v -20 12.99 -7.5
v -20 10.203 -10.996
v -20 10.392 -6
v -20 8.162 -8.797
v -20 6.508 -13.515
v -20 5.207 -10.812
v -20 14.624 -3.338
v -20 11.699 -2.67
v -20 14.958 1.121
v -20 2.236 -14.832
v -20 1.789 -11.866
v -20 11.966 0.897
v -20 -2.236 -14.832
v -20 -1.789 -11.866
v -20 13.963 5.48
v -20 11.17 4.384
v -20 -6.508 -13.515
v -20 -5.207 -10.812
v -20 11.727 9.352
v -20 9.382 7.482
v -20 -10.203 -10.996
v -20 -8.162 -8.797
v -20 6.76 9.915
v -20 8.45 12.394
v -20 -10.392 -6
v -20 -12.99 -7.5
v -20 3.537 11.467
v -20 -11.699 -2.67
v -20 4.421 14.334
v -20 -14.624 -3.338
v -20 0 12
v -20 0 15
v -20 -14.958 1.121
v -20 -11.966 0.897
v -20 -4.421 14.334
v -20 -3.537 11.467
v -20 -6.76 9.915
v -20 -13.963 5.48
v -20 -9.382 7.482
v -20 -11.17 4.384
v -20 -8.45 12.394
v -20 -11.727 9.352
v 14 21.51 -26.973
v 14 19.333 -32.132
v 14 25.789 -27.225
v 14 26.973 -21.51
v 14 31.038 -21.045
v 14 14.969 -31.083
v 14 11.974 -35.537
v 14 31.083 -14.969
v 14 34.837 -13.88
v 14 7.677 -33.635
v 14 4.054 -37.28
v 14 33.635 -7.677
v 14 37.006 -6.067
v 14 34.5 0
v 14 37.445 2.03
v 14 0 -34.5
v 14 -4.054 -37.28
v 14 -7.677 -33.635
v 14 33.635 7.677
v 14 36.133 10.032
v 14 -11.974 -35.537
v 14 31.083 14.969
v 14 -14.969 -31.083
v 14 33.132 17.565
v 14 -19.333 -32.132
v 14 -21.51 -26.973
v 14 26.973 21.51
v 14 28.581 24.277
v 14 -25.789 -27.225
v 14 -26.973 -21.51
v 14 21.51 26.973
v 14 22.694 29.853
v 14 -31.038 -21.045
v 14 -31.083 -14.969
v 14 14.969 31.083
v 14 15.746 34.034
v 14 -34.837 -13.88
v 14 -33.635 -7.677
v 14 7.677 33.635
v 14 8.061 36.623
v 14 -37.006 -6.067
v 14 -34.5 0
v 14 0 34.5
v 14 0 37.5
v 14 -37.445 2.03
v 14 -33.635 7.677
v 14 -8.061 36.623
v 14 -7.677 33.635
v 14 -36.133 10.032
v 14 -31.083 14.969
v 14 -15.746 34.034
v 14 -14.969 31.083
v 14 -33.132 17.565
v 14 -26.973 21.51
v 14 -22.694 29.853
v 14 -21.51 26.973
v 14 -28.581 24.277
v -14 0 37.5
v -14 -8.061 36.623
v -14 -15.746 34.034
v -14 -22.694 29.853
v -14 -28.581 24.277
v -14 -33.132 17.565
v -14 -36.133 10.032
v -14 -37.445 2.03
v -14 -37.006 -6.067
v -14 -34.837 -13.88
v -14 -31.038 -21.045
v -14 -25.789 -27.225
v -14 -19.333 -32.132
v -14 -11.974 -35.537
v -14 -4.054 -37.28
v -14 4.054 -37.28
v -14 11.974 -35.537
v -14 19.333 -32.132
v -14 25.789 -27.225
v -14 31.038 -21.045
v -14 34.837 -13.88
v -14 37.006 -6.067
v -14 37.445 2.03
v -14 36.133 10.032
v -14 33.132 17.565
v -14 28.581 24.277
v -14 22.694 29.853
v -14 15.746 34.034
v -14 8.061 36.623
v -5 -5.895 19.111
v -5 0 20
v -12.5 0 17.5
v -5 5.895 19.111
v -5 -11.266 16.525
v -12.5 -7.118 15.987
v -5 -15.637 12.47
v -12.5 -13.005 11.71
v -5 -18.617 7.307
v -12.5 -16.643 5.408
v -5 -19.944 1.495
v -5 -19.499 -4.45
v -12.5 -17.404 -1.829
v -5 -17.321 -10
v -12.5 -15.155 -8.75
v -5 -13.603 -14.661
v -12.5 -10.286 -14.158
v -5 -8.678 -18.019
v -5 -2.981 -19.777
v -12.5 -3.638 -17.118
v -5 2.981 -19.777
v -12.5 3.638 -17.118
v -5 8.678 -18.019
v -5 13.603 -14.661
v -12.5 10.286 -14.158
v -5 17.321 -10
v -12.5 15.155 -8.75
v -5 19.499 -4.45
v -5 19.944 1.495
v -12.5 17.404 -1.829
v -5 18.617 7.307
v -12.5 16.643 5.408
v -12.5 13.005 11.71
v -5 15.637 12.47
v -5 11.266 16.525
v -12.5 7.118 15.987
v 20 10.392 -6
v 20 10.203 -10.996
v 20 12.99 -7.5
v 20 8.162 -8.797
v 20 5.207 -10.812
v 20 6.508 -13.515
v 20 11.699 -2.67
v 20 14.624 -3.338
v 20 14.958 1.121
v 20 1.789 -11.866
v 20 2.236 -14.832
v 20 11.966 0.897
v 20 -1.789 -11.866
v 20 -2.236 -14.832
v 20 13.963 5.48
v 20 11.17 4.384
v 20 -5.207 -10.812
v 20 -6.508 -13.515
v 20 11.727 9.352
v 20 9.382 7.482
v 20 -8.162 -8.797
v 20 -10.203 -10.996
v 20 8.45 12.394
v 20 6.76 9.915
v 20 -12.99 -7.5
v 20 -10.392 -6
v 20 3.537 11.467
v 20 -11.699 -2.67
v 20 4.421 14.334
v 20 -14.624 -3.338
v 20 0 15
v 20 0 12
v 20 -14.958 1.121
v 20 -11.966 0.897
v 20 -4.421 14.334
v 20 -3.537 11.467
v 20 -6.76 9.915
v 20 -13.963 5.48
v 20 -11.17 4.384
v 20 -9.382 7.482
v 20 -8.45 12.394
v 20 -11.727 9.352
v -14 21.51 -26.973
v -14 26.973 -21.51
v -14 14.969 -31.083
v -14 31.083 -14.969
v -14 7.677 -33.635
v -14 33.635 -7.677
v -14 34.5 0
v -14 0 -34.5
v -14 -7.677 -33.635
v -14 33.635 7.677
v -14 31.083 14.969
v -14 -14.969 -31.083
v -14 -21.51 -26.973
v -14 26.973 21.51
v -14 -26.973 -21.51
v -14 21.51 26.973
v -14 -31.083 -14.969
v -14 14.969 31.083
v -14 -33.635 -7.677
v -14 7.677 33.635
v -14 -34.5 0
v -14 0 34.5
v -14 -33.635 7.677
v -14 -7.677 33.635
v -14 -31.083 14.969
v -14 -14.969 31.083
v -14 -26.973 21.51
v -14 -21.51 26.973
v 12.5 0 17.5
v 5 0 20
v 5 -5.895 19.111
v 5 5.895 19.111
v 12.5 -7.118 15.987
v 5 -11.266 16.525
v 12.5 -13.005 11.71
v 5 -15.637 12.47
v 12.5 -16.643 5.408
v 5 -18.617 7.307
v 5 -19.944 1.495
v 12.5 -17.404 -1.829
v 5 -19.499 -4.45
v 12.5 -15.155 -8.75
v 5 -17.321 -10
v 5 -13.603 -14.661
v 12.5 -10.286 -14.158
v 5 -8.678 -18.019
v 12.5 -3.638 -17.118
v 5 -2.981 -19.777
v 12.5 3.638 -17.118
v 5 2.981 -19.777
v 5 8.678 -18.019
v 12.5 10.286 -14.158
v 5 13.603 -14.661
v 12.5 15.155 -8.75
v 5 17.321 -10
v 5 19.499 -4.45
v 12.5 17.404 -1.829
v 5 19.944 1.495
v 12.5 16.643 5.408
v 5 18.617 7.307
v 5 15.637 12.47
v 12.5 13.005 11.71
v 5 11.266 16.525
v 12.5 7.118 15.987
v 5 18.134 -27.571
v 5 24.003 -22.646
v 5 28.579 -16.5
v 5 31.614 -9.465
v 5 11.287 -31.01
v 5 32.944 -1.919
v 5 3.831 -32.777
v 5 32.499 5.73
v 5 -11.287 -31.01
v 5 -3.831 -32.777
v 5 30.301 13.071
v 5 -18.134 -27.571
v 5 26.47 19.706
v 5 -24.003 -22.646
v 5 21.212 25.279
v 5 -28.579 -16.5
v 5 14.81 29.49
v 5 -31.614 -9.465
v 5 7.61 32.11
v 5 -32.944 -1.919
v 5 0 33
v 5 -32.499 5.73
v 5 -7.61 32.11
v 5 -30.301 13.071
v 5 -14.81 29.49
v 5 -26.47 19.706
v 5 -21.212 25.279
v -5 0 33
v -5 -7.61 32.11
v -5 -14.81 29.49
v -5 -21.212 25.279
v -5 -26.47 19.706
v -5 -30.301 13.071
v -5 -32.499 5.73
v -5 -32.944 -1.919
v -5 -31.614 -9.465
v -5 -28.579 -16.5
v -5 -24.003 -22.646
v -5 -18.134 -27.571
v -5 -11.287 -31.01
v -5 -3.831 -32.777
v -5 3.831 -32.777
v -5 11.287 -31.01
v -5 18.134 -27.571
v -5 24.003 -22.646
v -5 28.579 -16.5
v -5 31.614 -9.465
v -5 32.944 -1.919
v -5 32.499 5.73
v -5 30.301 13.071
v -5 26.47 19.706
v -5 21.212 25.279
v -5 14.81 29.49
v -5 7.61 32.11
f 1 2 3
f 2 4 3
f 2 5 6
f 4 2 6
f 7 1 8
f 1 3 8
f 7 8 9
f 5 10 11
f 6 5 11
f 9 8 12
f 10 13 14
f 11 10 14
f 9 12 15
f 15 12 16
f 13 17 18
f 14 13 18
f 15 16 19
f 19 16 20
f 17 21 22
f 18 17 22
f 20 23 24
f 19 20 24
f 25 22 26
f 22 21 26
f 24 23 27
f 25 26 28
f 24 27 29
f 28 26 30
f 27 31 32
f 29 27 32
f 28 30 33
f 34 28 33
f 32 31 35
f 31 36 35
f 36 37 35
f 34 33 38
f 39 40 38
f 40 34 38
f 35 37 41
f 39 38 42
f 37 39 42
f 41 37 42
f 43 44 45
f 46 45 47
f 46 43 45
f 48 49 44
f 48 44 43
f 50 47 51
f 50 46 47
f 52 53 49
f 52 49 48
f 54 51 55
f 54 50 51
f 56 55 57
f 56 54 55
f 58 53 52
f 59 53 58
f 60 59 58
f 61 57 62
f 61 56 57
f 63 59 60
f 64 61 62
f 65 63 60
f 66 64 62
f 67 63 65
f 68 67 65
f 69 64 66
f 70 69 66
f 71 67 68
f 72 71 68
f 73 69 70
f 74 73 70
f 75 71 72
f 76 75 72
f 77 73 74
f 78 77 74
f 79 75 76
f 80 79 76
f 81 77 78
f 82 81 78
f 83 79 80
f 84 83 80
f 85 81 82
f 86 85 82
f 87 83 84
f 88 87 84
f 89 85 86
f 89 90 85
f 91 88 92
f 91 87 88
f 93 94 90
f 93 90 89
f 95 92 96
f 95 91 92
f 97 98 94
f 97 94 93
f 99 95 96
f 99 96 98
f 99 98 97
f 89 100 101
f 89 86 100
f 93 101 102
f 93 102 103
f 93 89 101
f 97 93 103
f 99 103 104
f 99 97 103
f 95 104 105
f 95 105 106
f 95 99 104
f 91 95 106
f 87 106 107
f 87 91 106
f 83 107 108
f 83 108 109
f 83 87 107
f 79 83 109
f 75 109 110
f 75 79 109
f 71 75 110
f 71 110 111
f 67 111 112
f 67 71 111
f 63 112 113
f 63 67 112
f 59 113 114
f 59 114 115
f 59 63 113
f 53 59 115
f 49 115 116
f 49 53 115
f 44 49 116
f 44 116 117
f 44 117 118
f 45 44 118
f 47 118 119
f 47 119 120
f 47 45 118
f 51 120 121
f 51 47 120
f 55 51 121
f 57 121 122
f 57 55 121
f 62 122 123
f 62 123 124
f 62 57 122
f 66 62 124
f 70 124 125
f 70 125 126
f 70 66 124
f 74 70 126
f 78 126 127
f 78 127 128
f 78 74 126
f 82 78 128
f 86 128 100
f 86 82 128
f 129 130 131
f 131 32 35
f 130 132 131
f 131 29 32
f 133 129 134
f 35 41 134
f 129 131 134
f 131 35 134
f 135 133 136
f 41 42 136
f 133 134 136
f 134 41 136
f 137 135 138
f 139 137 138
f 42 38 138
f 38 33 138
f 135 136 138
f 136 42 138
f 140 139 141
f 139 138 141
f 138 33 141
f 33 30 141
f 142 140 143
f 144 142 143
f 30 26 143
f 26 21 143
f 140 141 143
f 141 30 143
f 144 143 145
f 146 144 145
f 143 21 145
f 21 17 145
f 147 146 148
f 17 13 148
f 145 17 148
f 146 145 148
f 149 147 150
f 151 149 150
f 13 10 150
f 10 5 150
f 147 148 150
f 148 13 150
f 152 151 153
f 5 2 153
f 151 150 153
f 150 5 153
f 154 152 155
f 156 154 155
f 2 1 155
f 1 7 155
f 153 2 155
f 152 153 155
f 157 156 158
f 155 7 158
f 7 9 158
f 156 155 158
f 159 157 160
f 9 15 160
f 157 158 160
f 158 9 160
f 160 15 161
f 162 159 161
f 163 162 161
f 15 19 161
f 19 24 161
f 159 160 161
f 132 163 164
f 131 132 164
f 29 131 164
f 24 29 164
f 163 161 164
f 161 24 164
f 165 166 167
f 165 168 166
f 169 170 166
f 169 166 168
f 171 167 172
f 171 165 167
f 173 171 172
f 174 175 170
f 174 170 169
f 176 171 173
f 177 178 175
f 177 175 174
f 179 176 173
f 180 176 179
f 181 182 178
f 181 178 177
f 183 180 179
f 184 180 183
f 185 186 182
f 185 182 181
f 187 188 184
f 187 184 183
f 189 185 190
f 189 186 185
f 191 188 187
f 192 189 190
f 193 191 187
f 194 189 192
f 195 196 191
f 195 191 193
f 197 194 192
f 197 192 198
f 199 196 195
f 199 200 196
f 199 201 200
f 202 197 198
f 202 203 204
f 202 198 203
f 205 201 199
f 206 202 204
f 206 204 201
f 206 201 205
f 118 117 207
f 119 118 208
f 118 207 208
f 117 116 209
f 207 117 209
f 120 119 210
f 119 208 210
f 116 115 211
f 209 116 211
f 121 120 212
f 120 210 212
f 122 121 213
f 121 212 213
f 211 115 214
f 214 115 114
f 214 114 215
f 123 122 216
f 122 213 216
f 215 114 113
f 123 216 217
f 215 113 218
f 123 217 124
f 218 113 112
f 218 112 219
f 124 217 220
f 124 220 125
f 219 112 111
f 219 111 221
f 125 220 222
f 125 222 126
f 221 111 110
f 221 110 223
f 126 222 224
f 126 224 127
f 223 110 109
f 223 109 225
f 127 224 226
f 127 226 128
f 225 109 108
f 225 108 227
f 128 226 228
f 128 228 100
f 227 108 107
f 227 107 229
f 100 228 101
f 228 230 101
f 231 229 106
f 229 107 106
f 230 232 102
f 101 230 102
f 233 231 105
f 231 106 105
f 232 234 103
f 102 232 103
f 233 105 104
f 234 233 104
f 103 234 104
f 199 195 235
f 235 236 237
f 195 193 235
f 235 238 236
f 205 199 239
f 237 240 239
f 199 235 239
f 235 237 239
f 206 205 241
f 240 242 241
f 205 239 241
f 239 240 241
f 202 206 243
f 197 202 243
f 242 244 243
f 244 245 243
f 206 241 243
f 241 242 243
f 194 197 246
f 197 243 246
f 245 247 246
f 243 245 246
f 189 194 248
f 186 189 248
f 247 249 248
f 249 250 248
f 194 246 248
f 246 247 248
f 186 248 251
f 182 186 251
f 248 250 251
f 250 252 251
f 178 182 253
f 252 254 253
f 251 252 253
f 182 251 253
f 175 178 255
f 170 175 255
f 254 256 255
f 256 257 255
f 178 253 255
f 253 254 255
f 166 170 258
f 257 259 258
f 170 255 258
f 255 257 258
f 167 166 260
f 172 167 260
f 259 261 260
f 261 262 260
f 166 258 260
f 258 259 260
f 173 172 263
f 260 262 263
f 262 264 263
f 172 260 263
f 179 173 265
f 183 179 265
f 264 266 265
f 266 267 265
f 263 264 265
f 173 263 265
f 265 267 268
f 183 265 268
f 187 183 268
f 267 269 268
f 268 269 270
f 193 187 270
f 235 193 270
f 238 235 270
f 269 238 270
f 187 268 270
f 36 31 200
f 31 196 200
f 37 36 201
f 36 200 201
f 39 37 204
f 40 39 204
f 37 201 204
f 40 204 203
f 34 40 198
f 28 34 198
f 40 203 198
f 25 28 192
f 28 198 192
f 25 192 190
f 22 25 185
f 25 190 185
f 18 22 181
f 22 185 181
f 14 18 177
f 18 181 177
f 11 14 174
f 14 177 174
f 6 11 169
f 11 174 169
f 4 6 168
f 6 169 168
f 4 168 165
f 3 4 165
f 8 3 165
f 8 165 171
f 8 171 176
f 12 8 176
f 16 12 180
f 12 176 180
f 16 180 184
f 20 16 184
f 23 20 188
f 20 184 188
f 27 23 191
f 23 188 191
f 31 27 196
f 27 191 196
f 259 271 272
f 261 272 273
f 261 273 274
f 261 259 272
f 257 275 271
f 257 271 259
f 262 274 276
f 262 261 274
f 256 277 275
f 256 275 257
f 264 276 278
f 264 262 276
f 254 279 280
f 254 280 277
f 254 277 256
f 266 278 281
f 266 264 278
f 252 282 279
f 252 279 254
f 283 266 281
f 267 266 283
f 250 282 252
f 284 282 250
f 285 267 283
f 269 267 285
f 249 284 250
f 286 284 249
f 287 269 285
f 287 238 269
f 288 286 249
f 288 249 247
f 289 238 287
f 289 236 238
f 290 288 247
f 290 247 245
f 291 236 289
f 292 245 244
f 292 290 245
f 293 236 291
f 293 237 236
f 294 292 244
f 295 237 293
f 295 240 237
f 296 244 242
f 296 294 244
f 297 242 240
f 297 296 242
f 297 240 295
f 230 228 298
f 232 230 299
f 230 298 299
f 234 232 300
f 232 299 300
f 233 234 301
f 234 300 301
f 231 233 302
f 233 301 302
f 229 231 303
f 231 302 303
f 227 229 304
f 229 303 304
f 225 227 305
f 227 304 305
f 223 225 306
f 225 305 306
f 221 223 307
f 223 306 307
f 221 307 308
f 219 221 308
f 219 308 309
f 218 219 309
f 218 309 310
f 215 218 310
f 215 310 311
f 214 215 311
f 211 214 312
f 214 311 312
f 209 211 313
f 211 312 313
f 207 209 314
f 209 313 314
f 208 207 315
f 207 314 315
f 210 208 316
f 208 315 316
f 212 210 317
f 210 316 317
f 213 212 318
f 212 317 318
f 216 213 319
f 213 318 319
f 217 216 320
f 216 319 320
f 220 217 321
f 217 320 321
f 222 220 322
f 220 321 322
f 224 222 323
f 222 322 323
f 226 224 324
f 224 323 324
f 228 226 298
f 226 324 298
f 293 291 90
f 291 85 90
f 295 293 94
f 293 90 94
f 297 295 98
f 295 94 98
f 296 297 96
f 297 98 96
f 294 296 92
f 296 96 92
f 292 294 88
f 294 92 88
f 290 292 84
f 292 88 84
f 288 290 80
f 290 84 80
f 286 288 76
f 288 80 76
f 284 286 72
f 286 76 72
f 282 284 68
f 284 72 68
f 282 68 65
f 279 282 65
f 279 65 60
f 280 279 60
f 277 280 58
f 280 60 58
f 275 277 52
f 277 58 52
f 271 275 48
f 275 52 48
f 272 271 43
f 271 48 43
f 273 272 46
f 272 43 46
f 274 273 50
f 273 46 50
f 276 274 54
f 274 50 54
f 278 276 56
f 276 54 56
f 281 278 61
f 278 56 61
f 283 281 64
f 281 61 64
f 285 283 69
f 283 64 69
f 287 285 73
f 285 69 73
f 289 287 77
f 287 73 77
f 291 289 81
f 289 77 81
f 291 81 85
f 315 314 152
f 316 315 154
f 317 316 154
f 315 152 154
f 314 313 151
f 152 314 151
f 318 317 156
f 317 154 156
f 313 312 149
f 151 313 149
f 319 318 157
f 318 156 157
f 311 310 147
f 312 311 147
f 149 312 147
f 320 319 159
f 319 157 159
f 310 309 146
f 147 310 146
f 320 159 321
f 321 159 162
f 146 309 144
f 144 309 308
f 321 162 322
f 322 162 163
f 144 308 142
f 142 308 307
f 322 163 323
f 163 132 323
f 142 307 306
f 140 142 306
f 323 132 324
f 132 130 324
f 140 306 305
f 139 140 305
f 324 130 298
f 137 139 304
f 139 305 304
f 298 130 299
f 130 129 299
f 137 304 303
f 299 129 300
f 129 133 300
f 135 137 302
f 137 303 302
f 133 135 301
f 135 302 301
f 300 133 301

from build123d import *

# Parameters (mm, degrees)
SKETCH1_W   = 40
SKETCH1_H   = 3
SKETCH1_W_2 = 10
SKETCH1_H_2 = 13
SKETCH1_W_3 = 28


with BuildPart() as part:
    # Sketch1 → Revolve1 (revolve)
    with BuildSketch(Plane.XY, mode=Mode.PRIVATE) as revolve1_sk:
        with Locations((0, -13.5)):
            Rectangle(SKETCH1_W, SKETCH1_H)
        Polygon((20, -15), (5, -20), (-5, -20), (-20, -15), align=None)
        with Locations((0, -26.5)):
            Rectangle(SKETCH1_W_2, SKETCH1_H_2)
        Polygon((5, -33), (14, -34.5), (-14, -34.5), (-5, -33), align=None)
        with Locations((0, -36)):
            Rectangle(SKETCH1_W_3, SKETCH1_H)
    revolve(revolve1_sk.sketch.rotate(Axis((0, 0, 0), (1, 0, 0)), 270), axis=Axis((0, 0, 0), (1, 0, 0)))


solid = part.part
